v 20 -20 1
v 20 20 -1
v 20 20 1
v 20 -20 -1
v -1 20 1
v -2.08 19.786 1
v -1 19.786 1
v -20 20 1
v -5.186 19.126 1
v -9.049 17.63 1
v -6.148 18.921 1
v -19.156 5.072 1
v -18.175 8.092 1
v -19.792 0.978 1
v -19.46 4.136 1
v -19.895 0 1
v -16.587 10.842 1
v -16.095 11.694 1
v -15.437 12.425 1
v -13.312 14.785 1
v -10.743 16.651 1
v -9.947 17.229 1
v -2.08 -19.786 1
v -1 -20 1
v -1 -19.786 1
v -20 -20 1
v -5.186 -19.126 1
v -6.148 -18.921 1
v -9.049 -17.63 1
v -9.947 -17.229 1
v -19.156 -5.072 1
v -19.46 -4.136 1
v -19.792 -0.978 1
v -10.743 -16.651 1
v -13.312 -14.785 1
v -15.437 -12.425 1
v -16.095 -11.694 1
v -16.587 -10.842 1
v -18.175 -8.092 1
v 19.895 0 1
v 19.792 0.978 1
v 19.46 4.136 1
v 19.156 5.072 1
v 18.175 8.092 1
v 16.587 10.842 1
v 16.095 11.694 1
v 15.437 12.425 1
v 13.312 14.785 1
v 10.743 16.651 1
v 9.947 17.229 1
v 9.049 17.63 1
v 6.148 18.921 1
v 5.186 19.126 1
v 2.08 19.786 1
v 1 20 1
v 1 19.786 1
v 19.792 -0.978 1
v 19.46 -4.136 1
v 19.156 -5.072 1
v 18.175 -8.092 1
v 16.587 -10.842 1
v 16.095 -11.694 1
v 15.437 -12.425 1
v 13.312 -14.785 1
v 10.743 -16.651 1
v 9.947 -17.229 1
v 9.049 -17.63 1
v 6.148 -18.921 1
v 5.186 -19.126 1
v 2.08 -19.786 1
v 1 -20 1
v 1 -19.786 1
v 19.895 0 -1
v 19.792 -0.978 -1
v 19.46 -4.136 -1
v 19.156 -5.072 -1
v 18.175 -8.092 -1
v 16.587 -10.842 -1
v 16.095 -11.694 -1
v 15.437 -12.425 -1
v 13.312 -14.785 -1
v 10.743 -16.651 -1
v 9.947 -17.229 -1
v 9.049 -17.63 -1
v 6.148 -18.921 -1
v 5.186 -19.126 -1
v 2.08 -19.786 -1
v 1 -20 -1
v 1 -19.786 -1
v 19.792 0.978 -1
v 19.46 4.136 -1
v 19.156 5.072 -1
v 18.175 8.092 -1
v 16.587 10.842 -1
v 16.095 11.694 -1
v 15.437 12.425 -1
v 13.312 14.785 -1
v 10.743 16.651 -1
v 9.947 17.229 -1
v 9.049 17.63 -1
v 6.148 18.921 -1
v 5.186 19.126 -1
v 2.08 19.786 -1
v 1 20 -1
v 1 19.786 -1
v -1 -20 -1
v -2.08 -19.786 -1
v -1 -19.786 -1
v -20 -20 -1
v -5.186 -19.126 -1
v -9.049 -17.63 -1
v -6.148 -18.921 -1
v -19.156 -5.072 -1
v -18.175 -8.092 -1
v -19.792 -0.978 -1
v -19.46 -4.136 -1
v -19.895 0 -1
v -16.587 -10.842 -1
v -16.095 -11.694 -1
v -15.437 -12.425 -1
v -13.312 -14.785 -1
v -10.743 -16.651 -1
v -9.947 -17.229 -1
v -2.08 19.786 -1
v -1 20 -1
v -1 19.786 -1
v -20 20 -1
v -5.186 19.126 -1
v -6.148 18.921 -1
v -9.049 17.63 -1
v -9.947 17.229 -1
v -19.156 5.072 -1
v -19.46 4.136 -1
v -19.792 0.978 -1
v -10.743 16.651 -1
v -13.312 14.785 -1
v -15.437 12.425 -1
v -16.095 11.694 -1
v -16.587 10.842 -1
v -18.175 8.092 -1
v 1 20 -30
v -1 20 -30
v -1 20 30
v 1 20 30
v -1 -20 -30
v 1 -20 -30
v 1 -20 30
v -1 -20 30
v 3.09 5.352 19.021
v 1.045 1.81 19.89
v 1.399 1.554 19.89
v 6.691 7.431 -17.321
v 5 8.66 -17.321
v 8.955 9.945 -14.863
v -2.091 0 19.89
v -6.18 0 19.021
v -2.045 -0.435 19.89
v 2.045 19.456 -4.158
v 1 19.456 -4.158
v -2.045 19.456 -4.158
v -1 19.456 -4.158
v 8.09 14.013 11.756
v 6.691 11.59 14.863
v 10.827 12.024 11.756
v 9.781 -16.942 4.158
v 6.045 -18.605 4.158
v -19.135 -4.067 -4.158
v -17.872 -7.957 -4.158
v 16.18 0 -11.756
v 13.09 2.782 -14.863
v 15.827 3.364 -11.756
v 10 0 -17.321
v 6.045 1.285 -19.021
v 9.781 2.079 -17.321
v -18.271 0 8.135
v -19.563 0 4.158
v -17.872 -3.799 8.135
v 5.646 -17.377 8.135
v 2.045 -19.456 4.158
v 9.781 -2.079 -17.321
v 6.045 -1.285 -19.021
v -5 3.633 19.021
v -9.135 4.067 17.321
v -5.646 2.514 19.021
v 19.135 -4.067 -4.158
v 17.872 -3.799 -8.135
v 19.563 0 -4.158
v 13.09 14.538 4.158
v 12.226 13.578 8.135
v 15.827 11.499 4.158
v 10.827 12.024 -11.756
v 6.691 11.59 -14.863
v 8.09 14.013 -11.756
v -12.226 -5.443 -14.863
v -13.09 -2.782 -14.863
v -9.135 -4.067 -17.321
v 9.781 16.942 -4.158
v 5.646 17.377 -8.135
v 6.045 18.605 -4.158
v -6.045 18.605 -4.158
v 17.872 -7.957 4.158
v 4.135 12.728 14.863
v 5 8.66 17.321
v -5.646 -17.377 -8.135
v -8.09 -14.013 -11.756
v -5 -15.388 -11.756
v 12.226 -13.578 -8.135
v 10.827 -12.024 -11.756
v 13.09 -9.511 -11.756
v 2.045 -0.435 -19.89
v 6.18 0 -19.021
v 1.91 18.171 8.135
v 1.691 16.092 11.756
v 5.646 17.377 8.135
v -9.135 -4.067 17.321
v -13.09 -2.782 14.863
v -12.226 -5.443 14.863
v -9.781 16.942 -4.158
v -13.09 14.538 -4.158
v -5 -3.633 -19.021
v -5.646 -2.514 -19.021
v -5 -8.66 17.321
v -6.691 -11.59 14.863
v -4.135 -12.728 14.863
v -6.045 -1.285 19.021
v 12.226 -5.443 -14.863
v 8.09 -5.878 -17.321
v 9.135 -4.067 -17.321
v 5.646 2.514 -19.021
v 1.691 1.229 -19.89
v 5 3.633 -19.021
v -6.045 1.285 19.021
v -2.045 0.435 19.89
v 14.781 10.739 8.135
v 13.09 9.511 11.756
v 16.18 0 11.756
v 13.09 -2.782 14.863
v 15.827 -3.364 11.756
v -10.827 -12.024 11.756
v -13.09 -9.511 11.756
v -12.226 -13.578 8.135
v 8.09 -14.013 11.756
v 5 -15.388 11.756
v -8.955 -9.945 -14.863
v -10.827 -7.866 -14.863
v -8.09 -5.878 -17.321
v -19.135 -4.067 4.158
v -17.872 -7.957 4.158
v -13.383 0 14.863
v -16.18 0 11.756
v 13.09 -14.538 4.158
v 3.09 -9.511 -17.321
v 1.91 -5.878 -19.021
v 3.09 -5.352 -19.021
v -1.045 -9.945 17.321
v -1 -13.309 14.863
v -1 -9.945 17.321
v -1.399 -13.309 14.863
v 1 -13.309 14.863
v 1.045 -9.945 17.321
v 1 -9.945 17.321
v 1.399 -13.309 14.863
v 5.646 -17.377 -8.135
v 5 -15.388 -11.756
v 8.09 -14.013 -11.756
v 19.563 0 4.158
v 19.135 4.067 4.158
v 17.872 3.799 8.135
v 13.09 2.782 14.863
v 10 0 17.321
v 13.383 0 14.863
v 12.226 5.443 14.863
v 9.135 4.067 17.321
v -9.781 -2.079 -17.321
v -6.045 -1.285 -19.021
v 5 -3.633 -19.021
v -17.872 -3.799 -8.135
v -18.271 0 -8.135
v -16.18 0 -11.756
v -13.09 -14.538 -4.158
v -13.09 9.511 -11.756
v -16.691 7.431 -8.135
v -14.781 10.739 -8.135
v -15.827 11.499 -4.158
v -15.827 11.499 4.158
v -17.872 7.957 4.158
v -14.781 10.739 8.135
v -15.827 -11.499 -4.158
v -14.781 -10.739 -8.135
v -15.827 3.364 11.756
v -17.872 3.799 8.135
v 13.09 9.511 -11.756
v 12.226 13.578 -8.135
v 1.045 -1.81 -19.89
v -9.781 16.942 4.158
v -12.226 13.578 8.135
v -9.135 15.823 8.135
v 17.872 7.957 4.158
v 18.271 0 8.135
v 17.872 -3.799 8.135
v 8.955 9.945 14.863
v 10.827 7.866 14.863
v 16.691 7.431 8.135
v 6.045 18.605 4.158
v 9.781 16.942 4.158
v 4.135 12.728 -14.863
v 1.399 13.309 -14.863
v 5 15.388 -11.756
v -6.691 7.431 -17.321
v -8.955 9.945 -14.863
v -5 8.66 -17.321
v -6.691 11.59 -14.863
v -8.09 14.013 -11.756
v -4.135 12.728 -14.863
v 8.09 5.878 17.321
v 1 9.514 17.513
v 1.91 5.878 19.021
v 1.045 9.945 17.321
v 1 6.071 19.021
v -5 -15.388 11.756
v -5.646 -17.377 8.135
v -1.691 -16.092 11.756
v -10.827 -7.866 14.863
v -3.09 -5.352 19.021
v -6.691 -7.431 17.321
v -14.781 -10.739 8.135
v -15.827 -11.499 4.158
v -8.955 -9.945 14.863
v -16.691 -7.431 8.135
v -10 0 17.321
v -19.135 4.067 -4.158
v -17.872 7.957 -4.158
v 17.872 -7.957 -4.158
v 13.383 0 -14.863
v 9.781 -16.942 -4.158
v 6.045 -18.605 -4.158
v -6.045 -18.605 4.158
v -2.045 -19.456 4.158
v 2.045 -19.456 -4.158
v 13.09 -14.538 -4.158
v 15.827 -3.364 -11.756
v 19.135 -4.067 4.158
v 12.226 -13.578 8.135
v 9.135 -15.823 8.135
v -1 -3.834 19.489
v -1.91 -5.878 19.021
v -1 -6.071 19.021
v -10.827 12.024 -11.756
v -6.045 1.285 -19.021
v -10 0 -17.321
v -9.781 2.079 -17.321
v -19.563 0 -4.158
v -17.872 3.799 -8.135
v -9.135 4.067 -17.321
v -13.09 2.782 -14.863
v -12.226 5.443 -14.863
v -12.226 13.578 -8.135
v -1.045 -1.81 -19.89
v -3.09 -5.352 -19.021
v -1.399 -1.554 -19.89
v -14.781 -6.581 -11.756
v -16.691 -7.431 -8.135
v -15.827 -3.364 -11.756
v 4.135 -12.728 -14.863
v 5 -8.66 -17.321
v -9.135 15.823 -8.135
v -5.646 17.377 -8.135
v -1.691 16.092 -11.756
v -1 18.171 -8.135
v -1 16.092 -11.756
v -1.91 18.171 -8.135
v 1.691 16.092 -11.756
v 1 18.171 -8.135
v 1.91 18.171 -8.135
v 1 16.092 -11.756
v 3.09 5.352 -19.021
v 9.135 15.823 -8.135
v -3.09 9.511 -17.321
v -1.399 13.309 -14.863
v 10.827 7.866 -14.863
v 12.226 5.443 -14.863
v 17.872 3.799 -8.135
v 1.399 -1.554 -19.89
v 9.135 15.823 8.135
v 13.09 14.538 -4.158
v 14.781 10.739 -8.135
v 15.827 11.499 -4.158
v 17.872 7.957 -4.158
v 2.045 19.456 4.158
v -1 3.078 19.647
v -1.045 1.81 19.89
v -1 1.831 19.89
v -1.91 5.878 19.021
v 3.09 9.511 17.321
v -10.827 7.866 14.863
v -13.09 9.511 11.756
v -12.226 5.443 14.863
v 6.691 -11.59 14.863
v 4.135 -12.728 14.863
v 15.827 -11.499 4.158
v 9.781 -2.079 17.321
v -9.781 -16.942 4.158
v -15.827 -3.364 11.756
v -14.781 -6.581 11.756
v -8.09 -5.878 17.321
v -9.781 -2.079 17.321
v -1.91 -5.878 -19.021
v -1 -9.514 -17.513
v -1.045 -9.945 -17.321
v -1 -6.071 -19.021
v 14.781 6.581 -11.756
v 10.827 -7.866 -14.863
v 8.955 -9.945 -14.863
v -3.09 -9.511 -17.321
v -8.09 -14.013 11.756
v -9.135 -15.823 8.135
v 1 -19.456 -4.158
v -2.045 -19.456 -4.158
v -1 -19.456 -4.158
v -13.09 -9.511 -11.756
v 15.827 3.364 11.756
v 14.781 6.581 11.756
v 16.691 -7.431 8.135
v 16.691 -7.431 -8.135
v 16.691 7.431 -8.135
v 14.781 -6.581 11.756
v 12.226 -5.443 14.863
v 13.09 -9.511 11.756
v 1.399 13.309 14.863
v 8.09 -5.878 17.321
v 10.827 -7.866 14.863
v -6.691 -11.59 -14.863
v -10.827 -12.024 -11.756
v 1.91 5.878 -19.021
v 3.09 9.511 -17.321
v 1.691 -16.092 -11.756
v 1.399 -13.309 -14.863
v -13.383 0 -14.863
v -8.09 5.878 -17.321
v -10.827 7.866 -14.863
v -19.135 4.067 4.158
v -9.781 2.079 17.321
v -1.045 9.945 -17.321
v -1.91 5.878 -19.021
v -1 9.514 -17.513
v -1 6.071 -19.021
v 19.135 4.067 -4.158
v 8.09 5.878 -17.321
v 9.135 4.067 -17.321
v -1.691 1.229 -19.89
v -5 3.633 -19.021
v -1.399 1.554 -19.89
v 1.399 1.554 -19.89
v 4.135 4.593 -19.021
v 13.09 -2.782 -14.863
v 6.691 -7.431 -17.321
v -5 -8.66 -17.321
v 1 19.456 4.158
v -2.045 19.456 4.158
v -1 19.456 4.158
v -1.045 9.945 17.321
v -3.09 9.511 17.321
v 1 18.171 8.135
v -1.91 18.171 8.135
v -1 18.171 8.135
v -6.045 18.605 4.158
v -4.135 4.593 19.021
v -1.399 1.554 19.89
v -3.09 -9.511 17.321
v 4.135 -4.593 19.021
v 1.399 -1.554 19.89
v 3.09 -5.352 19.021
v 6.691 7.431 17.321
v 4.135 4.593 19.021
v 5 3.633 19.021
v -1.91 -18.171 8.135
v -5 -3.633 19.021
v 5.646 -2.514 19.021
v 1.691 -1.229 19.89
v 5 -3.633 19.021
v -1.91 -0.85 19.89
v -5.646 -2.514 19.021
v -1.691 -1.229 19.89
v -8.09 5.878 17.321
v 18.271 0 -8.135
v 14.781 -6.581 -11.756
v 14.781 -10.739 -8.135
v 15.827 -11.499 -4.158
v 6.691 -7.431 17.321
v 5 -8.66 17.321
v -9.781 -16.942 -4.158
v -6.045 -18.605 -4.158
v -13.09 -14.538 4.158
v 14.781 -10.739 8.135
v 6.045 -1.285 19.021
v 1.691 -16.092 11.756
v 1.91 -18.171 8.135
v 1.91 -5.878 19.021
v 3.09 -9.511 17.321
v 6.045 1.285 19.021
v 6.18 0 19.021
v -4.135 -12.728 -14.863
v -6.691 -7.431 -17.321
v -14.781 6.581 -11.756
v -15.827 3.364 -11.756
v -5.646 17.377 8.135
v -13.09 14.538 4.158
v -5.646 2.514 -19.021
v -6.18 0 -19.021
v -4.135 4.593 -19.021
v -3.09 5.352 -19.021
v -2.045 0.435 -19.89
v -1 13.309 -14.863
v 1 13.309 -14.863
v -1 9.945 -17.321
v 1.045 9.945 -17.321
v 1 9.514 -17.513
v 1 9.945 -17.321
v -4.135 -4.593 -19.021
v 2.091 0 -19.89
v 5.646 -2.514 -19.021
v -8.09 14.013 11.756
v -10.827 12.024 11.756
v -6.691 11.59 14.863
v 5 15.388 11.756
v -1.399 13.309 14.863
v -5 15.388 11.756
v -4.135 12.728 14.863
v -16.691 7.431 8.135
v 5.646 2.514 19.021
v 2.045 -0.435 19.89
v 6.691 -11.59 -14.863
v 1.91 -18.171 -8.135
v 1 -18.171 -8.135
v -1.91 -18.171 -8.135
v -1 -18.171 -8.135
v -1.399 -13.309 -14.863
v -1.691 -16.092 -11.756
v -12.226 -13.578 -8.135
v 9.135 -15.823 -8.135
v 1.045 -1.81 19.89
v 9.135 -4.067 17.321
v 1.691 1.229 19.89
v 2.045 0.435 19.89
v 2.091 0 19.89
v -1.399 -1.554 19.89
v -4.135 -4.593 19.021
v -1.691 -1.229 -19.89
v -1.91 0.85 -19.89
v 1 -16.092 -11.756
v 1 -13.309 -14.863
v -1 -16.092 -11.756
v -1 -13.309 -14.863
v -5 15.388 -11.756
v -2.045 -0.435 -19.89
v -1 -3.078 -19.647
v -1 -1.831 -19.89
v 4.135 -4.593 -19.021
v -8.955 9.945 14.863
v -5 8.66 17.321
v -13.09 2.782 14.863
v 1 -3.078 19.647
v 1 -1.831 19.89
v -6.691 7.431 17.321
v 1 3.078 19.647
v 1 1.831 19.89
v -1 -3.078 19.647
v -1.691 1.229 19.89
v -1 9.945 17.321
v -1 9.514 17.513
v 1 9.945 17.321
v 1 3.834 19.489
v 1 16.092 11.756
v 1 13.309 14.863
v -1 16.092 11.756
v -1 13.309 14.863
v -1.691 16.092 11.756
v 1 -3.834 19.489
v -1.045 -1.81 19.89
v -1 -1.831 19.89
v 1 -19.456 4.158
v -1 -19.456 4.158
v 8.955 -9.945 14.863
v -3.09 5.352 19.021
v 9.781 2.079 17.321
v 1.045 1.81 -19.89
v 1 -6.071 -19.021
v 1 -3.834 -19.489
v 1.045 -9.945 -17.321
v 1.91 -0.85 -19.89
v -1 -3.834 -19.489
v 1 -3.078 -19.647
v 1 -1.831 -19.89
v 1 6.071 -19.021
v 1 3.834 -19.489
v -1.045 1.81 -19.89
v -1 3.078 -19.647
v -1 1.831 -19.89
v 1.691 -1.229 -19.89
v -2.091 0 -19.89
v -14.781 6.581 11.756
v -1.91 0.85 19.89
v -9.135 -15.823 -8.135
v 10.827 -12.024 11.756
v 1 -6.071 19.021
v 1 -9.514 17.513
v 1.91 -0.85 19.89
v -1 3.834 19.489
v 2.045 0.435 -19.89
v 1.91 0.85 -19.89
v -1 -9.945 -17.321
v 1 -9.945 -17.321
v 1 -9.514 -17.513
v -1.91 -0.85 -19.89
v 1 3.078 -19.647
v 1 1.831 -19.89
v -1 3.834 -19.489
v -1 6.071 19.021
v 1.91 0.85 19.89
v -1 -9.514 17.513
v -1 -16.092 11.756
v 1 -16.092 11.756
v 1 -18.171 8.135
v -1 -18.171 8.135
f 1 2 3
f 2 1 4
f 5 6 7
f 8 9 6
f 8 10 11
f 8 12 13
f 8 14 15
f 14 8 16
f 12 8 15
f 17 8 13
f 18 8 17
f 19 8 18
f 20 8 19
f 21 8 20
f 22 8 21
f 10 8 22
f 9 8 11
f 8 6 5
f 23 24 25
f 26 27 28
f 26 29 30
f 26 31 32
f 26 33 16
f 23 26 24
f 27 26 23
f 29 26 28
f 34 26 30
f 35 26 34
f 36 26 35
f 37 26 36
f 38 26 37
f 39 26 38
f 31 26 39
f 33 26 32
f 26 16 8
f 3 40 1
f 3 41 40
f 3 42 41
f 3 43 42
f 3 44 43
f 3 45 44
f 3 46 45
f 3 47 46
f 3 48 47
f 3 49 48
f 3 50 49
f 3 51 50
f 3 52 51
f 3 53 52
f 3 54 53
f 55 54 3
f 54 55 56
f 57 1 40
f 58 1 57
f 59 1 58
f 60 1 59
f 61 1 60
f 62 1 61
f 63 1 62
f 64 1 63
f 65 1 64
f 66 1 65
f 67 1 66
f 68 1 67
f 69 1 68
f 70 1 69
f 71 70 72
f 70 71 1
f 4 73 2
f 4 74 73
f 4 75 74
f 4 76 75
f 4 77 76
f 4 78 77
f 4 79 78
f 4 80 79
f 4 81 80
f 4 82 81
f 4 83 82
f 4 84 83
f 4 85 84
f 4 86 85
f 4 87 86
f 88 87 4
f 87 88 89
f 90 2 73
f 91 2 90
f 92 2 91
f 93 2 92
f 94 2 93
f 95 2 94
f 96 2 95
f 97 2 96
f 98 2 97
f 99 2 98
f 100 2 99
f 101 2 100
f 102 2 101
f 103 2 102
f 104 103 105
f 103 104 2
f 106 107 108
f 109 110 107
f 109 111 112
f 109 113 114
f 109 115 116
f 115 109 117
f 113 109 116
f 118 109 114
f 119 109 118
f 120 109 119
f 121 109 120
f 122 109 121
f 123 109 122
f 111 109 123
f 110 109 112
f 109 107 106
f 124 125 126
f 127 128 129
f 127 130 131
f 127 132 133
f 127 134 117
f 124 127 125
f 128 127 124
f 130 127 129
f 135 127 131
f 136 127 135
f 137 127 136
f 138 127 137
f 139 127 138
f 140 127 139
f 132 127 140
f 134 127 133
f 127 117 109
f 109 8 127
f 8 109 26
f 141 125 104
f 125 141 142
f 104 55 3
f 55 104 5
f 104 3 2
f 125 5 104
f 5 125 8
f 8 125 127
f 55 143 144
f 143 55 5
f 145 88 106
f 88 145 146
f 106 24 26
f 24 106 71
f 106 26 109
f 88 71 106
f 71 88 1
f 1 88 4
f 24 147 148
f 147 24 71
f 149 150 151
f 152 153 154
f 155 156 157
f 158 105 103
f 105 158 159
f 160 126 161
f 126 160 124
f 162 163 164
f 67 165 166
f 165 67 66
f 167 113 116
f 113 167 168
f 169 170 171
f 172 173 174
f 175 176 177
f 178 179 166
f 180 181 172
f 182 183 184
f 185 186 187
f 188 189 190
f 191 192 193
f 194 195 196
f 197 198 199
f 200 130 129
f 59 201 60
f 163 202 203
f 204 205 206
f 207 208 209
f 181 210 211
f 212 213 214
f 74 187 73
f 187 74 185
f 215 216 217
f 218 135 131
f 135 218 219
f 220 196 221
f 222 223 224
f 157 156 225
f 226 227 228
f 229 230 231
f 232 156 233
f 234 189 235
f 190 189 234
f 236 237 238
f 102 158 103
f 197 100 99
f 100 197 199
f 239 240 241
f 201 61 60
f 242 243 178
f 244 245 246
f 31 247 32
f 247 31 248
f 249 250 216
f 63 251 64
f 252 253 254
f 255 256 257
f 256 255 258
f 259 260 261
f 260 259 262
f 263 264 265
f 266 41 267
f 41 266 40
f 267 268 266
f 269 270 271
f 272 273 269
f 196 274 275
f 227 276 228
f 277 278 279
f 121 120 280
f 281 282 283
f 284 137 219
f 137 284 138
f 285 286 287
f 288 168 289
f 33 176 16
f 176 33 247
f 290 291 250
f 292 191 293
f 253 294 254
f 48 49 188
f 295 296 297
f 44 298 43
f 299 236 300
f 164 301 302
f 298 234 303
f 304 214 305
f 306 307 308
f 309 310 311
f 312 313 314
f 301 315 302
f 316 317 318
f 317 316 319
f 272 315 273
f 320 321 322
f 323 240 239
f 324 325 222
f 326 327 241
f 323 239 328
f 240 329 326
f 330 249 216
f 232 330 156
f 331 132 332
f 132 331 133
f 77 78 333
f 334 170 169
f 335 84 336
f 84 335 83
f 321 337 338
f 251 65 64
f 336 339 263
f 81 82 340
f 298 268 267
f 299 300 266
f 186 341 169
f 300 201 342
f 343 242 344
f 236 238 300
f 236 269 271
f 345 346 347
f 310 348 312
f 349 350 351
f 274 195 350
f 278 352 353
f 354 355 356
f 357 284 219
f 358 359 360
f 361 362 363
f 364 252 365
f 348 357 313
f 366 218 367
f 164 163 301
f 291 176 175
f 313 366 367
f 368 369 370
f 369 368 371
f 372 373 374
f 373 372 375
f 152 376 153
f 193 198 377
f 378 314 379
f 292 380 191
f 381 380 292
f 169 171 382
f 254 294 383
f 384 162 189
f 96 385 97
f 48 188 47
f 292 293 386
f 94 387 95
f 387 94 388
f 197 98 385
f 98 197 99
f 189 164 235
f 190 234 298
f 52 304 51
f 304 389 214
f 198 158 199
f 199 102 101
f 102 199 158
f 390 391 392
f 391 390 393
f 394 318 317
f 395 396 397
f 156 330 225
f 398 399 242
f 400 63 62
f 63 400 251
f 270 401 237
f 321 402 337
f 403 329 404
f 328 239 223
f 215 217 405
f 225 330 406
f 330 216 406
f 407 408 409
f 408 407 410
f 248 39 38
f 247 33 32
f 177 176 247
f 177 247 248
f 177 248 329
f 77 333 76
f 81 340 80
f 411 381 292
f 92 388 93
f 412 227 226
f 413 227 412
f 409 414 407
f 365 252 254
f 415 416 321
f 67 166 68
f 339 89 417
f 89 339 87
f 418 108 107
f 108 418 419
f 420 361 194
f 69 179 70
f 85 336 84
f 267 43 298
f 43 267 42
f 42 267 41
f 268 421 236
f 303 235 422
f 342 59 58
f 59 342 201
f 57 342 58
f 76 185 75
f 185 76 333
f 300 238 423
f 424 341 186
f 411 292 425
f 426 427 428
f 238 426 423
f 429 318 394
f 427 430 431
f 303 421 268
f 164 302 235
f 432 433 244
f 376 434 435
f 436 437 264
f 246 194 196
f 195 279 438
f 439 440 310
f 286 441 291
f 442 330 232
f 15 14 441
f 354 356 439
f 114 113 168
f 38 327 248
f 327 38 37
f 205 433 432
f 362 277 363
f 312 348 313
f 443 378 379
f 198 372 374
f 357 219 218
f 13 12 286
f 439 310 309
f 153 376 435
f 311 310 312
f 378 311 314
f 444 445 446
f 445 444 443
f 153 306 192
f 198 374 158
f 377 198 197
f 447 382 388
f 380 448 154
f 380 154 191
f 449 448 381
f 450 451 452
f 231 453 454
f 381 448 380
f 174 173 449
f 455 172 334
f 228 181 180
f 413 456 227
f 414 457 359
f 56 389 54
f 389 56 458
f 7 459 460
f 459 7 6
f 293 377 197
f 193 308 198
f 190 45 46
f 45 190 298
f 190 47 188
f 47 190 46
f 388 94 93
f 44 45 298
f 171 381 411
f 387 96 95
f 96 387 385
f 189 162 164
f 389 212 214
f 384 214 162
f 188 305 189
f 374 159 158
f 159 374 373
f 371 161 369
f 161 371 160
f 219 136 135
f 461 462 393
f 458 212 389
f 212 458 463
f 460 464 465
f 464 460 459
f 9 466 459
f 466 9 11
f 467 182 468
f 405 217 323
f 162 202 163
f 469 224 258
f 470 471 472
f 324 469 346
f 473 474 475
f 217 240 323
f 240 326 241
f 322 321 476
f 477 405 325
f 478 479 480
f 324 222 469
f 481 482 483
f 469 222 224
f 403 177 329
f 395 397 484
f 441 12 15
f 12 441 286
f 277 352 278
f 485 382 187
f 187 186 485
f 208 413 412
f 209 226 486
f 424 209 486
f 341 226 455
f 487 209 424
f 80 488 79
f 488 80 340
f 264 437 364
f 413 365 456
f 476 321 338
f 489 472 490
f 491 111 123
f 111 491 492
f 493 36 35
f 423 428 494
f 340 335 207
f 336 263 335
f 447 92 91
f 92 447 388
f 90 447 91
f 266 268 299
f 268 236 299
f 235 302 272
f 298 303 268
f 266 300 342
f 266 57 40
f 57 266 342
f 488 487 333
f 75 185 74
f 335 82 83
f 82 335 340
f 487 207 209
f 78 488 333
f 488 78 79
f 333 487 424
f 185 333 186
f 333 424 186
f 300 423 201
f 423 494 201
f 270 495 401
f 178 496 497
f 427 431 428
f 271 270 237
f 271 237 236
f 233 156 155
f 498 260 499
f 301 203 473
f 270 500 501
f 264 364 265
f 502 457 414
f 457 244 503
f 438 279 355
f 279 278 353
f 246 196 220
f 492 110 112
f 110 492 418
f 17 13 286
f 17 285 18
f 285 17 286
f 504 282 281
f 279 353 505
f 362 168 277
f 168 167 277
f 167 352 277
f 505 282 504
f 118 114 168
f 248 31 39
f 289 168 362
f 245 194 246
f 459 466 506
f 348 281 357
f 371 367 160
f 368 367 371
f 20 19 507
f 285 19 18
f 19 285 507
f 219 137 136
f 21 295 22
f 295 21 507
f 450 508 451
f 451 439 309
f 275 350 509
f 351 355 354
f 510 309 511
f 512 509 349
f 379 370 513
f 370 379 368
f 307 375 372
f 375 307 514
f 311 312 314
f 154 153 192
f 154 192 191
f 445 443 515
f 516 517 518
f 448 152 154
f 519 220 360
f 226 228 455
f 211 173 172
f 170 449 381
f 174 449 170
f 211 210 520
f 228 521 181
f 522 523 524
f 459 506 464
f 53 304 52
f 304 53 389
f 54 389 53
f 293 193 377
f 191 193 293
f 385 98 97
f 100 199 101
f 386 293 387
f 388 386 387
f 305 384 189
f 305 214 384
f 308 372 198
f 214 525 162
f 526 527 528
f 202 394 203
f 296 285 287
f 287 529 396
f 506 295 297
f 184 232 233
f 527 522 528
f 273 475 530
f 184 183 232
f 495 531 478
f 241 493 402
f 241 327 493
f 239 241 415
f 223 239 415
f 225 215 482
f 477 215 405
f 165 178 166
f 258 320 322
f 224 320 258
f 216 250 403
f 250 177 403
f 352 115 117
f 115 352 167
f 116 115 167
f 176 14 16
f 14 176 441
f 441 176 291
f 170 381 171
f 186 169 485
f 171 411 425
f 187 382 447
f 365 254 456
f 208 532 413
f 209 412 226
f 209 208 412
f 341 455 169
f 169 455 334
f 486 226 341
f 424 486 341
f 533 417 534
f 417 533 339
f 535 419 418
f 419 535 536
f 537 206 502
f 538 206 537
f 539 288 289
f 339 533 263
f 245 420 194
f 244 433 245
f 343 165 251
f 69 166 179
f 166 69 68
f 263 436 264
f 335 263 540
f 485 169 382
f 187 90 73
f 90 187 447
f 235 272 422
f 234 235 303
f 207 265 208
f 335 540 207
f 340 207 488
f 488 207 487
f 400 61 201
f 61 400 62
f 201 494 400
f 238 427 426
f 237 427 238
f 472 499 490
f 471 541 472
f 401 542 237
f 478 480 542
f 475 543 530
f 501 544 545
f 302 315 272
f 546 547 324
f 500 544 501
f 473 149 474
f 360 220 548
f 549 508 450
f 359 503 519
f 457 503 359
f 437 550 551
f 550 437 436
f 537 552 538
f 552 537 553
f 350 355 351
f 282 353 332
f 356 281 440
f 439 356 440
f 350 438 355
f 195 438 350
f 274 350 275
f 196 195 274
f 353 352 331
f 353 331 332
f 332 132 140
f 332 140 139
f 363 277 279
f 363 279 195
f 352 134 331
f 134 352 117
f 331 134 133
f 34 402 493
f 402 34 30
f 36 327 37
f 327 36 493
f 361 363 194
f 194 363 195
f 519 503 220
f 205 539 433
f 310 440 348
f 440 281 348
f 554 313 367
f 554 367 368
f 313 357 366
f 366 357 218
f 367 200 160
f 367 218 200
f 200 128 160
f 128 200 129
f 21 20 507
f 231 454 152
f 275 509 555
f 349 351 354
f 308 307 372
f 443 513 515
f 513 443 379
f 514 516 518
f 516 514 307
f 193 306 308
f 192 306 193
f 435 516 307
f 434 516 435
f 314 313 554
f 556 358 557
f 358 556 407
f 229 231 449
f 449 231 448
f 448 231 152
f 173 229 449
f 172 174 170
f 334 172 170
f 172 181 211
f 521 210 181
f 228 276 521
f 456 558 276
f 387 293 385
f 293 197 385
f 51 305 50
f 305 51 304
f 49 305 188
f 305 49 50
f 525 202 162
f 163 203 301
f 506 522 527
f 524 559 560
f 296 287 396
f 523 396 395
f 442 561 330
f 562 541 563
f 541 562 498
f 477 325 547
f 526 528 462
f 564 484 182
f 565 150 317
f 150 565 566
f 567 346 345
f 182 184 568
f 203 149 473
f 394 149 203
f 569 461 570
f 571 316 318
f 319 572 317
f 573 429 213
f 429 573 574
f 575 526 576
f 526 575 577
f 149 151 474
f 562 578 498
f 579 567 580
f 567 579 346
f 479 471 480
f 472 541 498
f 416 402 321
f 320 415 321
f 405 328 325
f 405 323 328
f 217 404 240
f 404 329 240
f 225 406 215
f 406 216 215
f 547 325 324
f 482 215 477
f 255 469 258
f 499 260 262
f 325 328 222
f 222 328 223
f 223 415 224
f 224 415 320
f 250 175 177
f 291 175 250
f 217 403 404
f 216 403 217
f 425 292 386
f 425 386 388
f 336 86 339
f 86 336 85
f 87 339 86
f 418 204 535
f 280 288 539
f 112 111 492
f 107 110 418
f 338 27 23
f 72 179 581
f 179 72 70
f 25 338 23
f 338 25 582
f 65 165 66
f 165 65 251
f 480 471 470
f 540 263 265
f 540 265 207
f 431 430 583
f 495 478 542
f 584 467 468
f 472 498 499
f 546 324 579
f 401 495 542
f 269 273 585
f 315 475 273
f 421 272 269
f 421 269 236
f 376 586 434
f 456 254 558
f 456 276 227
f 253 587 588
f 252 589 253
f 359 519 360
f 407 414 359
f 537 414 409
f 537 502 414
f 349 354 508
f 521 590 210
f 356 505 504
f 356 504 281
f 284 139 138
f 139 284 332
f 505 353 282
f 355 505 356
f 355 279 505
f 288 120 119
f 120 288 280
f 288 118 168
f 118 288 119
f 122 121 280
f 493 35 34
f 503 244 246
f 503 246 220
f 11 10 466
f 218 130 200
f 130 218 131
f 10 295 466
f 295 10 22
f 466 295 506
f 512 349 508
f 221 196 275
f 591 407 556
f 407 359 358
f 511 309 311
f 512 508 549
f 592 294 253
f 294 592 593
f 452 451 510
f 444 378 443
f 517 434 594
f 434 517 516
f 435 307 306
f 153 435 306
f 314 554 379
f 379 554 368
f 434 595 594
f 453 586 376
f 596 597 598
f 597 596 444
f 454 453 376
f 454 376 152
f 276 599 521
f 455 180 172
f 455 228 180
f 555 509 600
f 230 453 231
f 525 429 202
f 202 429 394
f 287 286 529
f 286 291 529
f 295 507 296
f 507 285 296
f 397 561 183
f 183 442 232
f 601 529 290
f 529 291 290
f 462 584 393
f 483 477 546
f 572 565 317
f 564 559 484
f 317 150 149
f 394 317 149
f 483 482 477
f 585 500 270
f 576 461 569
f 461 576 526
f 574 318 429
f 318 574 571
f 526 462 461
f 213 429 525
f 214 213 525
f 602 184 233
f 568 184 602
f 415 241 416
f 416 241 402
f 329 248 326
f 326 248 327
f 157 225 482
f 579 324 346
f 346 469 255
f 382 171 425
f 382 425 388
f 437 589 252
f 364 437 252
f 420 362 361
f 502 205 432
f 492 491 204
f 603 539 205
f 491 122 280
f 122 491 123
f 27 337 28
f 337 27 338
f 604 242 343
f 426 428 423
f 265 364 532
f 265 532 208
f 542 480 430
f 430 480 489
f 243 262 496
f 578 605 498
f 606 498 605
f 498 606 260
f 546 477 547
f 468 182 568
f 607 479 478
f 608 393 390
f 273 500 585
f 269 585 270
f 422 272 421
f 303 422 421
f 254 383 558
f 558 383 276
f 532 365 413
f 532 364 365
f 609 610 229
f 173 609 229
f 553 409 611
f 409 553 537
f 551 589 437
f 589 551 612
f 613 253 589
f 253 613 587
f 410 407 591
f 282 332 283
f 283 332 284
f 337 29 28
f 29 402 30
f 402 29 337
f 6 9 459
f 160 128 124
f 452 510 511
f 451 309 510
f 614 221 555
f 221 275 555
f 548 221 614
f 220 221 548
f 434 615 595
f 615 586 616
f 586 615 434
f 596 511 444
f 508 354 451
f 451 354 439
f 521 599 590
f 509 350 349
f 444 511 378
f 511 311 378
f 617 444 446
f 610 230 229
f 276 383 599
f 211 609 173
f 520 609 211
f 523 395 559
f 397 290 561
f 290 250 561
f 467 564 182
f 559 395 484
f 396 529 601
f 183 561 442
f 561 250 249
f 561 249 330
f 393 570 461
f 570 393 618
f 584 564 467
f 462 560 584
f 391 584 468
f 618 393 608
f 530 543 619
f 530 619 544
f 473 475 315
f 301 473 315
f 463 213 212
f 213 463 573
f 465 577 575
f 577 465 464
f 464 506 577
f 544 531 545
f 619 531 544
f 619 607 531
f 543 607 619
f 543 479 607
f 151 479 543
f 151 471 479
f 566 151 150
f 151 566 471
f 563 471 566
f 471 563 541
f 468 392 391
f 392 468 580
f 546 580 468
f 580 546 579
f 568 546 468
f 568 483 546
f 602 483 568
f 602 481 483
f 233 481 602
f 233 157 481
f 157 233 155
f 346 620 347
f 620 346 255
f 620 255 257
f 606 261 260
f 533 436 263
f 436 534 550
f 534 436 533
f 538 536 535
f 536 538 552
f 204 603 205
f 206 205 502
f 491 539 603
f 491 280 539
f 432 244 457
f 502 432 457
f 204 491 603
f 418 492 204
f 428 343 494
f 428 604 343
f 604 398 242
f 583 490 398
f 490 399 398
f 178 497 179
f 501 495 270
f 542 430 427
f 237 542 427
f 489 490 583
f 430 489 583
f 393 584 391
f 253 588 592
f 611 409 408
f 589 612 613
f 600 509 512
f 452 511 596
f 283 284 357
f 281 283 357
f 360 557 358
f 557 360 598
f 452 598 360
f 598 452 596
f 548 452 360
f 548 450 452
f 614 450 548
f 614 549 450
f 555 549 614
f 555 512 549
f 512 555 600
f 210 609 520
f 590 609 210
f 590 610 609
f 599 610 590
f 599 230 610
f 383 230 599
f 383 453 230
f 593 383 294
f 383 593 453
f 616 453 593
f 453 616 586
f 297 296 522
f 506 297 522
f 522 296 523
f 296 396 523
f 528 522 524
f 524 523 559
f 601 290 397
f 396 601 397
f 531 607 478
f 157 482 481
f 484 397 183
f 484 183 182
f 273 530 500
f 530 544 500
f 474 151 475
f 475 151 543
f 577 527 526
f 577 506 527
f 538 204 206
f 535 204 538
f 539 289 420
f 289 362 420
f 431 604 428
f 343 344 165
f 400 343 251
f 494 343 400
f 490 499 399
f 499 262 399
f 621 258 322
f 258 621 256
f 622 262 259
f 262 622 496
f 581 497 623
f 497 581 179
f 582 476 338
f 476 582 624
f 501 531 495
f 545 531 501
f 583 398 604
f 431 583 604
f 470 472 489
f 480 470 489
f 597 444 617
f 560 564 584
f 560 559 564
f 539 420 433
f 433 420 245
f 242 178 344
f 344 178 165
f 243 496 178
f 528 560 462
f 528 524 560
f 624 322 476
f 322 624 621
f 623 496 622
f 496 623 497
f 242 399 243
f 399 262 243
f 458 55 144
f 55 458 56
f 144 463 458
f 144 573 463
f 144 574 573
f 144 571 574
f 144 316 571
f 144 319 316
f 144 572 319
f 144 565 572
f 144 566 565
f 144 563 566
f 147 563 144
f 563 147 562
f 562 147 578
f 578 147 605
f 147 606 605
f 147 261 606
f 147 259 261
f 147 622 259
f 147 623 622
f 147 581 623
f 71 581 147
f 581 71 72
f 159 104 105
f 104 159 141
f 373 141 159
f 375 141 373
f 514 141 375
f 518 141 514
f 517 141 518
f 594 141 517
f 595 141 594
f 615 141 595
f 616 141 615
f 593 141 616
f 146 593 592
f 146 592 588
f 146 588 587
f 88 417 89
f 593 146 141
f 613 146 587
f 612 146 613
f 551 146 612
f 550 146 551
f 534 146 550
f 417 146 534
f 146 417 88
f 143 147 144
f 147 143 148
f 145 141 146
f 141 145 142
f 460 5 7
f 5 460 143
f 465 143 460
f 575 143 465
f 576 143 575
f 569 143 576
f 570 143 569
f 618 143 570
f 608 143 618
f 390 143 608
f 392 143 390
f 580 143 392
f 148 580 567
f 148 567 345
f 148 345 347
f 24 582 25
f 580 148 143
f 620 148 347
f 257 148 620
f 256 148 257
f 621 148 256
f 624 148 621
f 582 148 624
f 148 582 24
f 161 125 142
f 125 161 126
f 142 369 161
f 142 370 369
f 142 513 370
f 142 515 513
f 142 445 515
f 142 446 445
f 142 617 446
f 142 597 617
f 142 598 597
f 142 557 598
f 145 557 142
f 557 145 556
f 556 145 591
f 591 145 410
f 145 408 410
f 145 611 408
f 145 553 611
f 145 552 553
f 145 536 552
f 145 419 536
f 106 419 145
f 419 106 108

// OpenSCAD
cube([40,40,2],center=true);
sphere(20);
cube([2,40,60],center=true);
